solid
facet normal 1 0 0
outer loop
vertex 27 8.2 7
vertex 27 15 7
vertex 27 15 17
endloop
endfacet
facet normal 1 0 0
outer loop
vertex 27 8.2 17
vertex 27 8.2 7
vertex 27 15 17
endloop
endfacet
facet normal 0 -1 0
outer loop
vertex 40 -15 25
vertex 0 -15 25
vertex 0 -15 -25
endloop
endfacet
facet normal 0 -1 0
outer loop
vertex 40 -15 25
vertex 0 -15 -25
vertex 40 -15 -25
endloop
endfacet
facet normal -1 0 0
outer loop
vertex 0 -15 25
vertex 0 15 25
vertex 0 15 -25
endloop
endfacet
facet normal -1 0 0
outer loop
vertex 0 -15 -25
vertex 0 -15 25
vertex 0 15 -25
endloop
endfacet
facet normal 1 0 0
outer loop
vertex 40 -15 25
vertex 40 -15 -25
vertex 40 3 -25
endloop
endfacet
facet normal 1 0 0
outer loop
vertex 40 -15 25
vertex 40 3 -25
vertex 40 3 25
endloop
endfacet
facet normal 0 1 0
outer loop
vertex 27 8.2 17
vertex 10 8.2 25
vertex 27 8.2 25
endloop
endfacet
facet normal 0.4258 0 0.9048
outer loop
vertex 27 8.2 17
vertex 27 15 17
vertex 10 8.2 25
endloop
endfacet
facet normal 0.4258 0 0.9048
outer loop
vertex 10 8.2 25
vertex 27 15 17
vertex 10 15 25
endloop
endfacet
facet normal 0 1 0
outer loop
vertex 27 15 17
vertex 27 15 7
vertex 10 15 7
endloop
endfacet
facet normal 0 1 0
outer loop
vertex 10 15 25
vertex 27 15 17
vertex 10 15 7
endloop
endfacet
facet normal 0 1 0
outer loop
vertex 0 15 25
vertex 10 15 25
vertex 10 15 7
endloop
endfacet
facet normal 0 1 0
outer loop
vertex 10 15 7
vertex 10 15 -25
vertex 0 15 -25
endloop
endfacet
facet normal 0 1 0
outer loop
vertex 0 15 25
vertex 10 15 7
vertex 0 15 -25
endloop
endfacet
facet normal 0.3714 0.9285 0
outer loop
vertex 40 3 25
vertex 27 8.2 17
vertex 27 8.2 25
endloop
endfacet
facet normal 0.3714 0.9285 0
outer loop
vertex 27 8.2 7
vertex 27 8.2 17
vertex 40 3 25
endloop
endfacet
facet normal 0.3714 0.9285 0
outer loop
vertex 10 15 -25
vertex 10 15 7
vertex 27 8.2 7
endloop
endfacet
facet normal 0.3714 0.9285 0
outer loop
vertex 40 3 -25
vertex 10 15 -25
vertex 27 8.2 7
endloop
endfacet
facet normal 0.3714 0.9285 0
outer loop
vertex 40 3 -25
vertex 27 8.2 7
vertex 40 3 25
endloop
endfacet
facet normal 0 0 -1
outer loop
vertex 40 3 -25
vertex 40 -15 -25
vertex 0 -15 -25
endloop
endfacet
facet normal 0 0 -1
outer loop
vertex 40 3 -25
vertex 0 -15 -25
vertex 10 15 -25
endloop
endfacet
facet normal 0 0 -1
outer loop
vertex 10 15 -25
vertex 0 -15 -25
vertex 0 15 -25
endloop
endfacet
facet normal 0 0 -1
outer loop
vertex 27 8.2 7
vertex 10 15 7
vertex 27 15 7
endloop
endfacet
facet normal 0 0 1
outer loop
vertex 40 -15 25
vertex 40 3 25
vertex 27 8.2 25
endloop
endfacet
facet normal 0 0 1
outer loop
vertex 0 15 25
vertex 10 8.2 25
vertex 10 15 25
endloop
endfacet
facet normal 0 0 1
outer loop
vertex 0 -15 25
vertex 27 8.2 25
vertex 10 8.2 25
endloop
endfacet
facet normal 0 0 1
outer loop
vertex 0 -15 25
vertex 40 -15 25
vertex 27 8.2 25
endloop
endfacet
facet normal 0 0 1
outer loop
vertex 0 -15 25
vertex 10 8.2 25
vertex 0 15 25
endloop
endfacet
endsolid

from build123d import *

# Parameters (mm, degrees)
SKETCH_1_W          = 50
SKETCH_1_H          = 30
EXTRUDE_1_DEPTH     = 40
CUT_EXTRUDE_1_DEPTH = 66.76473219
CUT_EXTRUDE_2_DEPTH = 56.901699437
SKETCH_4_W          = 17
SKETCH_4_H          = 6.8
CUT_EXTRUDE_3_DEPTH = 18
EXTRUDE_2_REACH     = 57.902
EXTRUDE_4_REACH     = 57.902


with BuildPart() as part:
    # Эскиз1 → Бобышка-Вытянуть1 (new body)
    with BuildSketch(Plane(origin=(0, 0, 0), x_dir=(0, 0, -1), z_dir=(1, 0, 0))):
        Rectangle(SKETCH_1_W, SKETCH_1_H)
    extrude(amount=EXTRUDE_1_DEPTH)

    # Эскиз2 → Вырез-Вытянуть1 (cut, through all)
    with BuildSketch(Plane.XY.offset(25)):
        Polygon((10, 15), (40, 3), (40, 15), align=None)
    extrude(amount=-CUT_EXTRUDE_1_DEPTH, mode=Mode.SUBTRACT)

    # Эскиз3 → Вырез-Вытянуть2 (cut, through all)
    with BuildSketch(Plane.XZ.offset(15)):
        Polygon((40, 13), (27, 25), (40, 25), align=None)
    extrude(amount=-CUT_EXTRUDE_2_DEPTH, mode=Mode.SUBTRACT)

    # Эскиз4 → Вырез-Вытянуть3 (cut)
    with BuildSketch(Plane.XY.offset(25)):
        with Locations((18.5, 11.6)):
            Rectangle(SKETCH_4_W, SKETCH_4_H)
    extrude(amount=-CUT_EXTRUDE_3_DEPTH, mode=Mode.SUBTRACT)

    # Бобышка-Вытянуть2: up to this face of the body (flat: up to its plane)
    extrude_2_end = Plane(part.part.faces().sort_by_distance((18.5, 8.2, 16))[0])
    # Эскиз5 → Бобышка-Вытянуть2 (add, up to the picked face)
    with BuildSketch(Plane(origin=(0, 15, 0), x_dir=(1, 0, 0), z_dir=(0, 1, 0)), mode=Mode.PRIVATE) as extrude_2_sk1:
        Polygon((10, -7), (27, -7), (27, -17), (10, -25), align=None)
    extrude_2_tool1 = split(extrude(extrude_2_sk1.sketch, amount=-EXTRUDE_2_REACH, mode=Mode.PRIVATE), bisect_by=extrude_2_end, keep=Keep.BOTH, mode=Mode.PRIVATE)
    add(extrude_2_tool1.solids().sort_by(Axis((17.690476, 15, 14.190476), (0, -1, 0)))[0])

    # Бобышка-Вытянуть4: up to this face of the body (flat: up to its plane)
    extrude_4_end = Plane(part.part.faces().sort_by_distance((26.036738351, 8.585304659, -5.85483871))[0])
    # Эскиз6 → Бобышка-Вытянуть4 (add, up to the picked face)
    with BuildSketch(Plane.XZ.offset(15), mode=Mode.PRIVATE) as extrude_4_sk1:
        Polygon((27, 25), (40, 13), (40, 25), align=None)
    extrude_4_tool1 = split(extrude(extrude_4_sk1.sketch, amount=-EXTRUDE_4_REACH, mode=Mode.PRIVATE), bisect_by=extrude_4_end, keep=Keep.BOTH, mode=Mode.PRIVATE)
    add(extrude_4_tool1.solids().sort_by(Axis((35.666667, -15, 21), (0, 1, 0)))[0])


solid = part.part
